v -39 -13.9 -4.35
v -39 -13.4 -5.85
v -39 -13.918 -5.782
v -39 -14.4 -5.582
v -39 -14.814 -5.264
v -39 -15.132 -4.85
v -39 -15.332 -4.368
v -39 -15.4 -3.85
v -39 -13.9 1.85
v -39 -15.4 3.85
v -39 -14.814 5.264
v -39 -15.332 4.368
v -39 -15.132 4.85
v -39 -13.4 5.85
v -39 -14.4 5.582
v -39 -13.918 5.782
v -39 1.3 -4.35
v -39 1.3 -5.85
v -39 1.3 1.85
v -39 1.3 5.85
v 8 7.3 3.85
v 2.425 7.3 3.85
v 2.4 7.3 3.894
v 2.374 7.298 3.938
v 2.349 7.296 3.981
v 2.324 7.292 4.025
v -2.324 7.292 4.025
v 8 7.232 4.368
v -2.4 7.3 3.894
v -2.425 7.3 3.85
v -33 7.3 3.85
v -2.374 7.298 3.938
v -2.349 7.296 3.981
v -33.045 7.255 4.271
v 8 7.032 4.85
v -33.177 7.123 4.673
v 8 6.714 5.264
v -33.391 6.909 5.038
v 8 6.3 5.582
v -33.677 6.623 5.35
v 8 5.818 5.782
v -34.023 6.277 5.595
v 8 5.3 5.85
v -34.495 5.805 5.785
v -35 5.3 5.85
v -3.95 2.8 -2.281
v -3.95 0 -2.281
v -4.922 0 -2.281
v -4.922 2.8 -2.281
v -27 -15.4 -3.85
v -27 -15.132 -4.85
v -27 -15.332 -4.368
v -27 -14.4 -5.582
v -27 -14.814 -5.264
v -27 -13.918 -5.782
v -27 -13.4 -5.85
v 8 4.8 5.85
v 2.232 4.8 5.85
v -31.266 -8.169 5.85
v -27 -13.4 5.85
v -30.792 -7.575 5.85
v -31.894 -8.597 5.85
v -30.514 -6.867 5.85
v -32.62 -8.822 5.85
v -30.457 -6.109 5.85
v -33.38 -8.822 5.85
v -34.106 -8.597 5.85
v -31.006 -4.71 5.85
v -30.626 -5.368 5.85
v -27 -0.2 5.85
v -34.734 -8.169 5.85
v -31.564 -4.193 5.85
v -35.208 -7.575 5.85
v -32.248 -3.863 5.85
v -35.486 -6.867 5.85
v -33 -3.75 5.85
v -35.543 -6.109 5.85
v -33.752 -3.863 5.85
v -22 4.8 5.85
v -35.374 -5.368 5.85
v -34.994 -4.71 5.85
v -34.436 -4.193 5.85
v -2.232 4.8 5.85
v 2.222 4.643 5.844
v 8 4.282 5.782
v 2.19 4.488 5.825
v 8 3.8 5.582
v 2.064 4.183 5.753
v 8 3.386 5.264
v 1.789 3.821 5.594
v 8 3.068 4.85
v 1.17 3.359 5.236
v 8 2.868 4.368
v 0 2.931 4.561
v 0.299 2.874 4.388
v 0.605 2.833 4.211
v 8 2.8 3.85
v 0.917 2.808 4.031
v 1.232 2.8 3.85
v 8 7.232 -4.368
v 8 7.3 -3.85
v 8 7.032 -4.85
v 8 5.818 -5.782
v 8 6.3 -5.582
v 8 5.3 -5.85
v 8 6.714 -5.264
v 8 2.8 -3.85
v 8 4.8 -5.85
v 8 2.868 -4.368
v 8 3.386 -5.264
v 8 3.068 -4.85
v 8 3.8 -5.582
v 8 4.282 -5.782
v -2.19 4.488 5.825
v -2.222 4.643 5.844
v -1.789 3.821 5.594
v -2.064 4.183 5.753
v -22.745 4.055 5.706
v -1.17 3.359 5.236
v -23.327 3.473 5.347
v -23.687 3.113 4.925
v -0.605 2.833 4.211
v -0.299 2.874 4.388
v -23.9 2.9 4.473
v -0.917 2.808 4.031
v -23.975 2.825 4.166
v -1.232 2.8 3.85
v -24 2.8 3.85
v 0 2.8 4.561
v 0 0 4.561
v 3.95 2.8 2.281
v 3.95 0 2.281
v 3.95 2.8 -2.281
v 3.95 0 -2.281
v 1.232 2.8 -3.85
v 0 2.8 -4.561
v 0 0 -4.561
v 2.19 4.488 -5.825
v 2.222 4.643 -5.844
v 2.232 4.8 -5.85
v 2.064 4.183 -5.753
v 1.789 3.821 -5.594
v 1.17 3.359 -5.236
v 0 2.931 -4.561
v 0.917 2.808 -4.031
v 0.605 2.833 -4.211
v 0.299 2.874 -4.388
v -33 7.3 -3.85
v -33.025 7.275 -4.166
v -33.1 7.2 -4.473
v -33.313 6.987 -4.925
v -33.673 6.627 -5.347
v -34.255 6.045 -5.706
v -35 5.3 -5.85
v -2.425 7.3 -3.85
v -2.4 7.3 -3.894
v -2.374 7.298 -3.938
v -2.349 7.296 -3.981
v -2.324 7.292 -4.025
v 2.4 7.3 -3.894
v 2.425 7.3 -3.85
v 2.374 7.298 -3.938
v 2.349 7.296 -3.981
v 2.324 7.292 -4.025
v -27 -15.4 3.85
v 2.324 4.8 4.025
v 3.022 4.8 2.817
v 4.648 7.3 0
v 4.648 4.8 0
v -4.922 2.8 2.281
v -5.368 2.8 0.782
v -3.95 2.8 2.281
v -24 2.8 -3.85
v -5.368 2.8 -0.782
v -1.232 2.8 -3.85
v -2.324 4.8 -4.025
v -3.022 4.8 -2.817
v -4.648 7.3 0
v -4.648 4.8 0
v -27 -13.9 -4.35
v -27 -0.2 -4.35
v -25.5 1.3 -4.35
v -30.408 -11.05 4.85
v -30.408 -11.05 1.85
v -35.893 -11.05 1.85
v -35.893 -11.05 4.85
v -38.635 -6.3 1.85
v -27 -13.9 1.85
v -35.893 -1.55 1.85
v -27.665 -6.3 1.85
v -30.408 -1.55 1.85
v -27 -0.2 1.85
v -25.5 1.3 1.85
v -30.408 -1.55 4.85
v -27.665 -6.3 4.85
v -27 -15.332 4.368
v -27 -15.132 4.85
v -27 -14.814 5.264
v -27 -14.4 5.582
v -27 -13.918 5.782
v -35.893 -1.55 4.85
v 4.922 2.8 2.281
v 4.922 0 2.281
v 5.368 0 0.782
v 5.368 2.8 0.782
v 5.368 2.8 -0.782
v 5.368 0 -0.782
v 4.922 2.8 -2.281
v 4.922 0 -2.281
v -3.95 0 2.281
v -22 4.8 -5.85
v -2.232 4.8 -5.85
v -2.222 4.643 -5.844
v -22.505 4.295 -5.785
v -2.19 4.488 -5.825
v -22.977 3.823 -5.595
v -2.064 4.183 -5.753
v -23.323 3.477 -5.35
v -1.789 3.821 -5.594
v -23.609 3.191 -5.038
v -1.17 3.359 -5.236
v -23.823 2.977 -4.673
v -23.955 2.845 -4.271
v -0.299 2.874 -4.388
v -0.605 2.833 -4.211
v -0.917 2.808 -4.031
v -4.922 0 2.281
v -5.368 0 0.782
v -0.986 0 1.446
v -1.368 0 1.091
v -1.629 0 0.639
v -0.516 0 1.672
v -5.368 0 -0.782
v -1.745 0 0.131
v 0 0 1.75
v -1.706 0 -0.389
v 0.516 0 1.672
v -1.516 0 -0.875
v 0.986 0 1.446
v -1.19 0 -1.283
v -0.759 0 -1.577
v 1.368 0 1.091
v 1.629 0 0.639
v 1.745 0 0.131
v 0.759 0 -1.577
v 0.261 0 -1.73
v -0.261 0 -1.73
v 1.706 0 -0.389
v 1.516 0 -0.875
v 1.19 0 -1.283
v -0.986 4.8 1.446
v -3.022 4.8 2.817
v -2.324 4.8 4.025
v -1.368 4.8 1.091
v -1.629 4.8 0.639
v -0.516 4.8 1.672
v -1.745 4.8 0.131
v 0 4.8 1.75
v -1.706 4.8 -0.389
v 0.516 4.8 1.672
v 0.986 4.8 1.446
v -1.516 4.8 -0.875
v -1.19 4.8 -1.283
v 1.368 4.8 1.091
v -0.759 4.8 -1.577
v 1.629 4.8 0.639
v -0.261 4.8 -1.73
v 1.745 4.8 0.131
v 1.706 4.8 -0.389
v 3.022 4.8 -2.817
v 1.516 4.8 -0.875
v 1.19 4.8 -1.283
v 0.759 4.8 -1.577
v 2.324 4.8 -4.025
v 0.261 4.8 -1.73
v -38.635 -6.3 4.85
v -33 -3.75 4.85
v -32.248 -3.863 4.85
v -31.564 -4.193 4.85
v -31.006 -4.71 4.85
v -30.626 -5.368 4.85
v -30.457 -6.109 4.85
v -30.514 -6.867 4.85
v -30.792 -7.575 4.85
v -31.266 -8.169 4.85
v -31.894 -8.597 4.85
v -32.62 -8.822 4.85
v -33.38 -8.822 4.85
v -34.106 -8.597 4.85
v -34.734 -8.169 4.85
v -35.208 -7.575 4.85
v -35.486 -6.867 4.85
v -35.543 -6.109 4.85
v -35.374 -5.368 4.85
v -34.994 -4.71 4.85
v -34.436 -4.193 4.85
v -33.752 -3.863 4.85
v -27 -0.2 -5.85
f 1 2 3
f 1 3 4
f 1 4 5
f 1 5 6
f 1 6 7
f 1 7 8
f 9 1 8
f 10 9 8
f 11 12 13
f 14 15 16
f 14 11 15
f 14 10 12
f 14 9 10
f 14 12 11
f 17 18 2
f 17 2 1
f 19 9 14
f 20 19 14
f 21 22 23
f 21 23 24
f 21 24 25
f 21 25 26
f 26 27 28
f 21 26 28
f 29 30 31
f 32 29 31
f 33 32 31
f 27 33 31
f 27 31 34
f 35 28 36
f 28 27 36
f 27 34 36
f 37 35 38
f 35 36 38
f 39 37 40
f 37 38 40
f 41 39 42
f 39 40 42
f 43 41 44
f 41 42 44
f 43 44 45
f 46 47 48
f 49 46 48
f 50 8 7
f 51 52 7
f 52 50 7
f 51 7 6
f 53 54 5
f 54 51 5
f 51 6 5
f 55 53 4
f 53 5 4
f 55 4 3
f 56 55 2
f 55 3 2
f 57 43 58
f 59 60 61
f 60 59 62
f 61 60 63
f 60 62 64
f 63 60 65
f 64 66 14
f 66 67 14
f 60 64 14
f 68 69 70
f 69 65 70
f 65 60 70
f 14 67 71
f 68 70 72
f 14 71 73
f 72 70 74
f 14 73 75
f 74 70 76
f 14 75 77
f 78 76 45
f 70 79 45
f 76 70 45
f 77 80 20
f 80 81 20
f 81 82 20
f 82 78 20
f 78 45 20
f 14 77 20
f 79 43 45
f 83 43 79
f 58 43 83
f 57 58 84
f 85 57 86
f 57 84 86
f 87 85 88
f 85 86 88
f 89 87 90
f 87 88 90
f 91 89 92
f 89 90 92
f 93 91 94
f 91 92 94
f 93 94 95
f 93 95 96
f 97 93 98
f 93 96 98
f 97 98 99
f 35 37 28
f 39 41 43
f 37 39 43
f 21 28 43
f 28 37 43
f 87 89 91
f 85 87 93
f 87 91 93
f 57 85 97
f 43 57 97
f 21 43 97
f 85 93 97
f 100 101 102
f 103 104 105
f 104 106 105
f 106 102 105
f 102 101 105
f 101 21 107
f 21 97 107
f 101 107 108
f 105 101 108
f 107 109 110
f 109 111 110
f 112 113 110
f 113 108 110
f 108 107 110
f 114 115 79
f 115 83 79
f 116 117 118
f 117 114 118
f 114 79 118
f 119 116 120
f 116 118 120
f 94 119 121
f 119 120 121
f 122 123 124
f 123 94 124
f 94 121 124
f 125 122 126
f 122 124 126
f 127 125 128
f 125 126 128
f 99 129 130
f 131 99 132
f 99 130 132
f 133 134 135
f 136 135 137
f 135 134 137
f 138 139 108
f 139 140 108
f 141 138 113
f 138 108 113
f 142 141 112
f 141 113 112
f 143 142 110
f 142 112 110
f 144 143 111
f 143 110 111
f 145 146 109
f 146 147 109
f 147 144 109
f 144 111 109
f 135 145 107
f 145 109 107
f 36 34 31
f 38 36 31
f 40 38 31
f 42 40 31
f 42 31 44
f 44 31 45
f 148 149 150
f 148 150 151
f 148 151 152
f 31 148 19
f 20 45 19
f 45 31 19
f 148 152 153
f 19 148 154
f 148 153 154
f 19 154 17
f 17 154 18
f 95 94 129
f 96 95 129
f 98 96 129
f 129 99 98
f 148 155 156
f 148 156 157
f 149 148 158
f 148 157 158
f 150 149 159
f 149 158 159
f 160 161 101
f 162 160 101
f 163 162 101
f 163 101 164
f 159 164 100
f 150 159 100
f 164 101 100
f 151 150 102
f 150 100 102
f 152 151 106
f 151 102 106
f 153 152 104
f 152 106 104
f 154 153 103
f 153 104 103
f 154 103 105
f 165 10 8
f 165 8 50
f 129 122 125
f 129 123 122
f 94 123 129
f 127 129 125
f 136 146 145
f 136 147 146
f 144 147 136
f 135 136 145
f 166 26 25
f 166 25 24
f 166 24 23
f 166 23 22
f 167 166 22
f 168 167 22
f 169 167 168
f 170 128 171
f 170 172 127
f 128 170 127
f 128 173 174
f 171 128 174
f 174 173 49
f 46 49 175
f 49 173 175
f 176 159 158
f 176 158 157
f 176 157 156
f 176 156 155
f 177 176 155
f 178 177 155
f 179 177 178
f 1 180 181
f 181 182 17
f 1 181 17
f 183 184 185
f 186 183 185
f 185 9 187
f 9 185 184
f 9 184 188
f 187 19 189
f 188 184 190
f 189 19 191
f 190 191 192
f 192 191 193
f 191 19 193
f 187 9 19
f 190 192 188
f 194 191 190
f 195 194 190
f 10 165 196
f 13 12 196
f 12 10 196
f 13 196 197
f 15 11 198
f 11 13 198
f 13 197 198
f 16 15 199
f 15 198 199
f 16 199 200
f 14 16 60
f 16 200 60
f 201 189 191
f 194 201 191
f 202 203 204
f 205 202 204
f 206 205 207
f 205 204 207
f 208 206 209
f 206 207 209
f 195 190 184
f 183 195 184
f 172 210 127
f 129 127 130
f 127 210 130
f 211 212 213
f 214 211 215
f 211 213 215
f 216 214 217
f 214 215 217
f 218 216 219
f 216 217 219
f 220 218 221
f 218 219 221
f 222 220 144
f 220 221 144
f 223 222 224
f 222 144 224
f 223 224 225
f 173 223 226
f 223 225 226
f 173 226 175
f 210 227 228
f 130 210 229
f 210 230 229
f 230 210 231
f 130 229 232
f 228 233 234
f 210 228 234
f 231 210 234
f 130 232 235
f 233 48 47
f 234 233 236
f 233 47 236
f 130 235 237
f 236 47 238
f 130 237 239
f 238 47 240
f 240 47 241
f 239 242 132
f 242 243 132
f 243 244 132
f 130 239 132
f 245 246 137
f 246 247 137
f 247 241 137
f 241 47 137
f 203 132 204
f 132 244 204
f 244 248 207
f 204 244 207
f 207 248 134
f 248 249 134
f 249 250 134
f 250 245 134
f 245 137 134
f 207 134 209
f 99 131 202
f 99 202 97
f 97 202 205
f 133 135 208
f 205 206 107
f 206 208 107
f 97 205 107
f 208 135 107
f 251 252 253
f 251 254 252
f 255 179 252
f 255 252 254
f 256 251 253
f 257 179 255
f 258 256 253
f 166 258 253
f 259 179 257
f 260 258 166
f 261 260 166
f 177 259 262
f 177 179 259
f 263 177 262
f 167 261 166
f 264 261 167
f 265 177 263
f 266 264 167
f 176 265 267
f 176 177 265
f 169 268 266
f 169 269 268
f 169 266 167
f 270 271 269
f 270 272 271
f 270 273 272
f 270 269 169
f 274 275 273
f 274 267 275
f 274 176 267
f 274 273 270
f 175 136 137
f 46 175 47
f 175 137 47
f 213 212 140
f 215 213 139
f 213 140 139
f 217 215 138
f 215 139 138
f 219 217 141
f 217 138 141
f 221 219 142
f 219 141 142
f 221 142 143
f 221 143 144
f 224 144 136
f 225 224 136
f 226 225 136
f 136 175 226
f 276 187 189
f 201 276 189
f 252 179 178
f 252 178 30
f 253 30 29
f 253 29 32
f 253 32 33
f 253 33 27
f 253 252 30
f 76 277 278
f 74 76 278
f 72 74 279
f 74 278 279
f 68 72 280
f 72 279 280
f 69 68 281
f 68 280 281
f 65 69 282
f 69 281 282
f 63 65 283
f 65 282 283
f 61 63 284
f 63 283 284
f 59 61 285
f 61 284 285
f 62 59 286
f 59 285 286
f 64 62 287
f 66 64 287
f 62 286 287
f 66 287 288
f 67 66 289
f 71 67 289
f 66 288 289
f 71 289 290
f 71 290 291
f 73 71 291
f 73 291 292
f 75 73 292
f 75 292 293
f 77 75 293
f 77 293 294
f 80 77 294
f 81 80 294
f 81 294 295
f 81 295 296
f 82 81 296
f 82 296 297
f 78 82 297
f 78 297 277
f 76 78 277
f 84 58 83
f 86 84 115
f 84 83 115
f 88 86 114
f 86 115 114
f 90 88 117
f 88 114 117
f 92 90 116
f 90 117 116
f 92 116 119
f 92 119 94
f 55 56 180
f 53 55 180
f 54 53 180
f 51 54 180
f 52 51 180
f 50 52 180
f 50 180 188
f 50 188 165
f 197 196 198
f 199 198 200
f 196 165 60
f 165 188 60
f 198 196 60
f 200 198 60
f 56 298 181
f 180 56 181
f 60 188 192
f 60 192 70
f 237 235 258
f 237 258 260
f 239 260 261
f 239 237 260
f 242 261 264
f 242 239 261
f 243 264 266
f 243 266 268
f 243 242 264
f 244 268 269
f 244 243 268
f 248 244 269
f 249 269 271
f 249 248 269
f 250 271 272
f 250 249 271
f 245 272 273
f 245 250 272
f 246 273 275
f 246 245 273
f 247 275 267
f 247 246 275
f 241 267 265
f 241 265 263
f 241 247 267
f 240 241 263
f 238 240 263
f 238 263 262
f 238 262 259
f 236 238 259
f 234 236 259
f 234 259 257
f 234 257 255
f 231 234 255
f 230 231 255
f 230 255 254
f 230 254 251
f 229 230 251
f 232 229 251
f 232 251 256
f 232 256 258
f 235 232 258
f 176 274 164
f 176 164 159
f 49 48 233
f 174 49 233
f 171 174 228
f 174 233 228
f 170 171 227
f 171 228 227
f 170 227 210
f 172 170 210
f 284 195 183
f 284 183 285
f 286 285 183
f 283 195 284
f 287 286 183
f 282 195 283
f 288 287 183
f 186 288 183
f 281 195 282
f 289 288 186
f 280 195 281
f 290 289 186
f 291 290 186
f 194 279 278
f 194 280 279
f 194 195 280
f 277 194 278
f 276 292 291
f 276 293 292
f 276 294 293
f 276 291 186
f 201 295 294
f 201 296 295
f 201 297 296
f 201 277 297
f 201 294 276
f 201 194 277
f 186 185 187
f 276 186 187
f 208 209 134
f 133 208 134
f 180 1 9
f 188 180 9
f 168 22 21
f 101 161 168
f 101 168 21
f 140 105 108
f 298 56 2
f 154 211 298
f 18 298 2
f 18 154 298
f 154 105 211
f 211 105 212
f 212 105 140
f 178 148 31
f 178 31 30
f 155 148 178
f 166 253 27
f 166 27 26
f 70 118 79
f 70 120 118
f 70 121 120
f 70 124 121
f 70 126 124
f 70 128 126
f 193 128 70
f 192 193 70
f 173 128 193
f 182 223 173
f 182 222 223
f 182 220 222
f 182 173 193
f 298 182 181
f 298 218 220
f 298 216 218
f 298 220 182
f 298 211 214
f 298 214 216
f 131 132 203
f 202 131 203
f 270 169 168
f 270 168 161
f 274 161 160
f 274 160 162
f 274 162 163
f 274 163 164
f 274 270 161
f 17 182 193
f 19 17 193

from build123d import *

# Parameters (mm, degrees)
SKETCH1_R           = 1.75
BOSS_EXTRUDE1_DEPTH = 2.8
SKETCH2_W           = 47
SKETCH2_H           = 11.7
BOSS_EXTRUDE2_DEPTH = 4.5
SKETCH2_4_R         = 1.75
BOSS_EXTRUDE3_DEPTH = 2
SKETCH3_W           = 12
SKETCH3_H           = 11.7
BOSS_EXTRUDE4_DEPTH = 18.2
SKETCH4_W           = 6.2
SKETCH4_H           = 15.2
CUT_EXTRUDE2_DEPTH  = 17.2
SKETCH5_R           = 2.55
CUT_EXTRUDE4_DEPTH  = 3
SKETCH5_2_R         = 2.55
CUT_EXTRUDE5_DEPTH  = 43.631561079
FILLET1_R           = 2
CHAMFER1_SIZE       = 3
FILLET2_R           = 2
CHAMFER2_SIZE       = 6


with BuildPart() as part:
    # Sketch1 → Boss-Extrude1 (new body)
    with BuildSketch(Plane(origin=(0, 0, 0), x_dir=(1, 0, 0), z_dir=(0, 1, 0))):
        with BuildLine():
            Line((-3.95, 2.280533563), (-4.922376628, 2.280533563))
            ThreePointArc((-4.922376628, 2.280533563), (-5.425, 0), (-4.922376628, -2.280533563))
            Line((-4.922376628, -2.280533563), (-3.95, -2.280533563))
            Line((-3.95, -2.280533563), (0, -4.561067127))
            Line((0, -4.561067127), (3.95, -2.280533563))
            Line((3.95, -2.280533563), (4.922376628, -2.280533563))
            ThreePointArc((4.922376628, -2.280533563), (5.425, 0), (4.922376628, 2.280533563))
            Line((4.922376628, 2.280533563), (3.95, 2.280533563))
            Line((3.95, 2.280533563), (0, 4.561067127))
            Line((0, 4.561067127), (-3.95, 2.280533563))
        make_face()
        with Locations(Location((0, 0, 0), (0, 0, 270))):
            Circle(SKETCH1_R, mode=Mode.SUBTRACT)
    extrude(amount=BOSS_EXTRUDE1_DEPTH)

    # Sketch2 → Boss-Extrude2 (add)
    with BuildSketch(Plane(origin=(0, 2.8, 0), x_dir=(1, 0, 0), z_dir=(0, 1, 0))):
        with Locations((-15.5, 0)):
            Rectangle(SKETCH2_W, SKETCH2_H)
        Polygon((4.647669667, 0), (2.323834833, 4.025), (-2.323834833, 4.025), (-4.647669667, 0), (-2.323834833, -4.025), (2.323834833, -4.025), align=None, mode=Mode.SUBTRACT)
    extrude(amount=BOSS_EXTRUDE2_DEPTH)

    # Sketch2<4> → Boss-Extrude3 (add)
    # profile 1 of 5: a face of its own
    with BuildSketch(Plane(origin=(0, 2.8, 0), x_dir=(1, 0, 0), z_dir=(0, 1, 0))):
        Polygon((0.9284955, 4.025), (3.0215045, 2.81660069), (2.323834833, 4.025), align=None)
    # profile 2 of 5: a face of its own
    with BuildSketch(Plane(origin=(0, 2.8, 0), x_dir=(1, 0, 0), z_dir=(0, 1, 0))):
        Polygon((3.0215045, -2.81660069), (4.647669667, 0), (3.0215045, 2.81660069), (0.9284955, 4.025), (-0.9284955, 4.025), (-3.0215045, 2.81660069), (-4.647669667, 0), (-3.0215045, -2.81660069), (-0.9284955, -4.025), (0.9284955, -4.025), align=None)
        with Locations(Location((0, 0, 0), (0, 0, 270))):
            Circle(SKETCH2_4_R, mode=Mode.SUBTRACT)
    # profile 3 of 5: a face of its own
    with BuildSketch(Plane(origin=(0, 2.8, 0), x_dir=(1, 0, 0), z_dir=(0, 1, 0))):
        Polygon((2.323834833, -4.025), (3.0215045, -2.81660069), (0.9284955, -4.025), align=None)
    # profile 4 of 5: a face of its own
    with BuildSketch(Plane(origin=(0, 2.8, 0), x_dir=(1, 0, 0), z_dir=(0, 1, 0))):
        Polygon((-2.323834833, -4.025), (-0.9284955, -4.025), (-3.0215045, -2.81660069), align=None)
    # profile 5 of 5: a face of its own
    with BuildSketch(Plane(origin=(0, 2.8, 0), x_dir=(1, 0, 0), z_dir=(0, 1, 0))):
        Polygon((-3.0215045, 2.81660069), (-0.9284955, 4.025), (-2.323834833, 4.025), align=None)
    extrude(amount=BOSS_EXTRUDE3_DEPTH)

    # Sketch3 → Boss-Extrude4 (add)
    with BuildSketch(Plane.XZ.offset(-2.8)):
        with Locations((-33, 0)):
            Rectangle(SKETCH3_W, SKETCH3_H)
    extrude(amount=BOSS_EXTRUDE4_DEPTH)

    # Sketch4 → Cut-Extrude2 (cut)
    with BuildSketch(Plane.ZY.offset(39)):
        with Locations((-1.25, -6.3)):
            Rectangle(SKETCH4_W, SKETCH4_H)
    extrude(amount=-CUT_EXTRUDE2_DEPTH, mode=Mode.SUBTRACT)

    # Sketch5 → Cut-Extrude4 (cut)
    with BuildSketch(Plane(origin=(0, 0, 1.85), x_dir=(-1, 0, 0), z_dir=(0, 0, -1))):
        Polygon((38.634973236, -6.3), (35.892559458, -1.55), (30.4077319, -1.55), (27.665318122, -6.3), (30.4077319, -11.05), (35.892559458, -11.05), align=None)
        with Locations(Location((33, -6.3, 0), (0, 0, 90))):
            Circle(SKETCH5_R, mode=Mode.SUBTRACT)
    extrude(amount=-CUT_EXTRUDE4_DEPTH, mode=Mode.SUBTRACT)

    # Sketch5<2> → Cut-Extrude5 (cut, through all)
    with BuildSketch(Plane(origin=(0, 0, 1.85), x_dir=(-1, 0, 0), z_dir=(0, 0, -1))):
        with Locations(Location((33, -6.3, 0), (0, 0, 90))):
            Circle(SKETCH5_2_R)
    extrude(amount=-CUT_EXTRUDE5_DEPTH, mode=Mode.SUBTRACT)

    # Fillet1
    # the kernel refuses this fillet: 2 mm, written as the material it takes off along each edge
    with BuildSketch(Plane(origin=(-22, -15.4, 5.85), x_dir=(0, 1, 0), z_dir=(-1, 0, 0)), Plane(origin=(-44, -15.4, -5.85), x_dir=(0, 1, 0), z_dir=(1, 0, 0))) as fillet1_piece_1:
        with BuildLine():
            CenterArc((FILLET1_R, FILLET1_R), FILLET1_R, 180, 90)
            Line((0, FILLET1_R), (0, 0))
            Line((0, 0), (FILLET1_R, 0))
        make_face()
    extrude(amount=22, mode=Mode.SUBTRACT)
    with BuildSketch(Plane(origin=(-44, 7.3, 5.85), x_dir=(0, -1, 0), z_dir=(1, 0, 0)), Plane(origin=(13, 7.3, -5.85), x_dir=(0, -1, 0), z_dir=(-1, 0, 0))) as fillet1_piece_2:
        with BuildLine():
            CenterArc((FILLET1_R, FILLET1_R), FILLET1_R, 180, 90)
            Line((0, FILLET1_R), (0, 0))
            Line((0, 0), (FILLET1_R, 0))
        make_face()
    extrude(amount=57, mode=Mode.SUBTRACT)

    # Chamfer1
    # the kernel refuses this chamfer: 3 mm, written as the material it adds along each edge
    with BuildSketch(Plane(origin=(-27, 2.8, -5.85), x_dir=(0.9996219169112968, 0.027495876610586334, 0), z_dir=(0, 0, 1))) as chamfer1_piece_1_section:
        Polygon((CHAMFER1_SIZE * 0.999621916911, -CHAMFER1_SIZE * 0.0274958766106), (-CHAMFER1_SIZE * 0.0274958766106, -CHAMFER1_SIZE * 0.999621916911), (0, 0), align=None)
    chamfer1_piece_1 = extrude(amount=11.7, mode=Mode.PRIVATE)
    chamfer1_piece_1 = split(chamfer1_piece_1, bisect_by=Plane(origin=(-25.819796748, 1.3, -5.1), z_dir=(0, 1, 0)), keep=Keep.TOP, mode=Mode.PRIVATE)
    chamfer1_piece_1 = split(chamfer1_piece_1, bisect_by=Plane(origin=(-25.819796748, 2.175297131, -4.35), z_dir=(0, 0, -1)), keep=Keep.TOP, mode=Mode.PRIVATE)
    add(chamfer1_piece_1)
    with BuildSketch(Plane(origin=(-27, 2.8, -5.85), x_dir=(0.9996219169112968, 0.027495876610586334, 0), z_dir=(0, 0, 1))) as chamfer1_piece_2_section:
        Polygon((CHAMFER1_SIZE * 0.999621916911, -CHAMFER1_SIZE * 0.0274958766106), (-CHAMFER1_SIZE * 0.0274958766106, -CHAMFER1_SIZE * 0.999621916911), (0, 0), align=None)
    chamfer1_piece_2 = extrude(amount=11.7, mode=Mode.PRIVATE)
    chamfer1_piece_2 = split(chamfer1_piece_2, bisect_by=Plane(origin=(-26.56328803, 1.3, -5.1), z_dir=(0, -1, 0)), keep=Keep.TOP, mode=Mode.PRIVATE)
    chamfer1_piece_2 = split(chamfer1_piece_2, bisect_by=Plane(origin=(-26.56328803, 0.754421165, -4.35), z_dir=(0, 0, -1)), keep=Keep.TOP, mode=Mode.PRIVATE)
    add(chamfer1_piece_2)
    with BuildSketch(Plane(origin=(-27, 2.8, -5.85), x_dir=(0.9996219169112968, 0.027495876610586334, 0), z_dir=(0, 0, 1))) as chamfer1_piece_3_section:
        Polygon((CHAMFER1_SIZE * 0.999621916911, -CHAMFER1_SIZE * 0.0274958766106), (-CHAMFER1_SIZE * 0.0274958766106, -CHAMFER1_SIZE * 0.999621916911), (0, 0), align=None)
    chamfer1_piece_3 = extrude(amount=11.7, mode=Mode.PRIVATE)
    chamfer1_piece_3 = split(chamfer1_piece_3, bisect_by=Plane(origin=(-25.819796748, 1.3, -1.25), z_dir=(0, 1, 0)), keep=Keep.TOP, mode=Mode.PRIVATE)
    chamfer1_piece_3 = split(chamfer1_piece_3, bisect_by=Plane(origin=(-25.819796748, 2.175297131, 1.85), z_dir=(0, 0, -1)), keep=Keep.TOP, mode=Mode.PRIVATE)
    chamfer1_piece_3 = split(chamfer1_piece_3, bisect_by=Plane(origin=(-25.819796748, 2.175297131, -4.35), z_dir=(0, 0, 1)), keep=Keep.TOP, mode=Mode.PRIVATE)
    add(chamfer1_piece_3)
    with BuildSketch(Plane(origin=(-27, 2.8, -5.85), x_dir=(0.9996219169112968, 0.027495876610586334, 0), z_dir=(0, 0, 1))) as chamfer1_piece_4_section:
        Polygon((CHAMFER1_SIZE * 0.999621916911, -CHAMFER1_SIZE * 0.0274958766106), (-CHAMFER1_SIZE * 0.0274958766106, -CHAMFER1_SIZE * 0.999621916911), (0, 0), align=None)
    chamfer1_piece_4 = extrude(amount=11.7, mode=Mode.PRIVATE)
    chamfer1_piece_4 = split(chamfer1_piece_4, bisect_by=Plane(origin=(-25.819796748, 1.3, 3.85), z_dir=(0, 1, 0)), keep=Keep.TOP, mode=Mode.PRIVATE)
    chamfer1_piece_4 = split(chamfer1_piece_4, bisect_by=Plane(origin=(-25.819796748, 2.175297131, 1.85), z_dir=(0, 0, 1)), keep=Keep.TOP, mode=Mode.PRIVATE)
    add(chamfer1_piece_4)
    with BuildSketch(Plane(origin=(-27, 2.8, -5.85), x_dir=(0.9996219169112968, 0.027495876610586334, 0), z_dir=(0, 0, 1))) as chamfer1_piece_5_section:
        Polygon((CHAMFER1_SIZE * 0.999621916911, -CHAMFER1_SIZE * 0.0274958766106), (-CHAMFER1_SIZE * 0.0274958766106, -CHAMFER1_SIZE * 0.999621916911), (0, 0), align=None)
    chamfer1_piece_5 = extrude(amount=11.7, mode=Mode.PRIVATE)
    chamfer1_piece_5 = split(chamfer1_piece_5, bisect_by=Plane(origin=(-26.56328803, 1.3, 3.85), z_dir=(0, -1, 0)), keep=Keep.TOP, mode=Mode.PRIVATE)
    chamfer1_piece_5 = split(chamfer1_piece_5, bisect_by=Plane(origin=(-26.56328803, 0.754421165, 1.85), z_dir=(0, 0, 1)), keep=Keep.TOP, mode=Mode.PRIVATE)
    add(chamfer1_piece_5)

    # Fillet2
    # the kernel refuses this fillet: 2 mm, written as the material it takes off along each edge
    with BuildSketch(Plane(origin=(-29, 2.8, 5.85), x_dir=(0, 1, 0), z_dir=(1, 0, 0))) as fillet2_piece_1_section:
        with BuildLine():
            CenterArc((FILLET2_R, -FILLET2_R), FILLET2_R, 90, 90)
            Line((0, -FILLET2_R), (0, 0))
            Line((0, 0), (FILLET2_R, 0))
        make_face()
    fillet2_piece_1 = extrude(amount=42, mode=Mode.PRIVATE)
    fillet2_piece_1 = split(fillet2_piece_1, bisect_by=Plane(origin=(-18.041164539, 8.758835461, 5.380594006), z_dir=(0.7071067811868302, -0.7071067811862648, 0)), keep=Keep.TOP, mode=Mode.PRIVATE)
    fillet2_piece_1 = split(fillet2_piece_1, bisect_by=Plane(origin=(-9.744227799, 3.236820588, 10.186899669), z_dir=(-0.5, 0, -0.8660254037844387)), keep=Keep.TOP, mode=Mode.PRIVATE)
    fillet2_piece_1 = split(fillet2_piece_1, bisect_by=Plane(origin=(-9.034496702, 3.236820588, -0.655001976), z_dir=(-0.4999999999999998, 0, 0.8660254037844388)), keep=Keep.TOP, mode=Mode.PRIVATE)
    add(fillet2_piece_1, mode=Mode.SUBTRACT)
    with BuildSketch(Plane(origin=(-29, 2.8, 5.85), x_dir=(0, 1, 0), z_dir=(1, 0, 0))) as fillet2_piece_2_section:
        with BuildLine():
            CenterArc((FILLET2_R, -FILLET2_R), FILLET2_R, 90, 90)
            Line((0, -FILLET2_R), (0, 0))
            Line((0, 0), (FILLET2_R, 0))
        make_face()
    fillet2_piece_2 = extrude(amount=42, mode=Mode.PRIVATE)
    fillet2_piece_2 = split(fillet2_piece_2, bisect_by=Plane(origin=(-0.44699773, 3.373635394, 4.819141386), z_dir=(0.5, 0, 0.8660254037844387)), keep=Keep.TOP, mode=Mode.PRIVATE)
    fillet2_piece_2 = split(fillet2_piece_2, bisect_by=Plane(origin=(0.44699773, 3.373635394, 4.819141386), z_dir=(-0.4999999999999998, 0, 0.8660254037844388)), keep=Keep.TOP, mode=Mode.PRIVATE)
    add(fillet2_piece_2, mode=Mode.SUBTRACT)
    with BuildSketch(Plane(origin=(-29, 2.8, 5.85), x_dir=(0, 1, 0), z_dir=(1, 0, 0))) as fillet2_piece_3_section:
        with BuildLine():
            CenterArc((FILLET2_R, -FILLET2_R), FILLET2_R, 90, 90)
            Line((0, -FILLET2_R), (0, 0))
            Line((0, 0), (FILLET2_R, 0))
        make_face()
    fillet2_piece_3 = extrude(amount=42, mode=Mode.PRIVATE)
    fillet2_piece_3 = split(fillet2_piece_3, bisect_by=Plane(origin=(5.072316414, 3.23833996, 1.632563879), z_dir=(0.5, 0, 0.8660254037844387)), keep=Keep.TOP, mode=Mode.PRIVATE)
    fillet2_piece_3 = split(fillet2_piece_3, bisect_by=Plane(origin=(5.777120332, 3.23833996, 7.896489105), z_dir=(0.4999999999999998, 0, -0.8660254037844388)), keep=Keep.TOP, mode=Mode.PRIVATE)
    add(fillet2_piece_3, mode=Mode.SUBTRACT)
    with BuildSketch(Plane(origin=(13, 2.8, -5.85), x_dir=(0, 0, 1), z_dir=(-1, 0, 0))) as fillet2_piece_4_section:
        with BuildLine():
            CenterArc((FILLET2_R, FILLET2_R), FILLET2_R, 180, 90)
            Line((0, FILLET2_R), (0, 0))
            Line((0, 0), (FILLET2_R, 0))
        make_face()
    fillet2_piece_4 = extrude(amount=42, mode=Mode.PRIVATE)
    fillet2_piece_4 = split(fillet2_piece_4, bisect_by=Plane(origin=(5.777120334, 3.23833996, -7.896489107), z_dir=(0.49999999999999983, 0, 0.8660254037844388)), keep=Keep.TOP, mode=Mode.PRIVATE)
    fillet2_piece_4 = split(fillet2_piece_4, bisect_by=Plane(origin=(5.072316416, 3.23833996, -1.632563878), z_dir=(0.4999999999999997, 0, -0.866025403784439)), keep=Keep.TOP, mode=Mode.PRIVATE)
    add(fillet2_piece_4, mode=Mode.SUBTRACT)
    with BuildSketch(Plane(origin=(13, 2.8, -5.85), x_dir=(0, 0, 1), z_dir=(-1, 0, 0))) as fillet2_piece_5_section:
        with BuildLine():
            CenterArc((FILLET2_R, FILLET2_R), FILLET2_R, 180, 90)
            Line((0, FILLET2_R), (0, 0))
            Line((0, 0), (FILLET2_R, 0))
        make_face()
    fillet2_piece_5 = extrude(amount=42, mode=Mode.PRIVATE)
    fillet2_piece_5 = split(fillet2_piece_5, bisect_by=Plane(origin=(0.44699773, 3.373635394, -4.819141386), z_dir=(-0.49999999999999983, 0, -0.8660254037844388)), keep=Keep.TOP, mode=Mode.PRIVATE)
    fillet2_piece_5 = split(fillet2_piece_5, bisect_by=Plane(origin=(-0.44699773, 3.373635394, -4.819141386), z_dir=(0.4999999999999997, 0, -0.866025403784439)), keep=Keep.TOP, mode=Mode.PRIVATE)
    add(fillet2_piece_5, mode=Mode.SUBTRACT)
    with BuildSketch(Plane(origin=(13, 2.8, -5.85), x_dir=(0, 0, 1), z_dir=(-1, 0, 0))) as fillet2_piece_6_section:
        with BuildLine():
            CenterArc((FILLET2_R, FILLET2_R), FILLET2_R, 180, 90)
            Line((0, FILLET2_R), (0, 0))
            Line((0, 0), (FILLET2_R, 0))
        make_face()
    fillet2_piece_6 = extrude(amount=42, mode=Mode.PRIVATE)
    fillet2_piece_6 = split(fillet2_piece_6, bisect_by=Plane(origin=(-18.041164541, 8.758835459, -5.380594006), z_dir=(0.7071067811868302, -0.7071067811862648, 0)), keep=Keep.TOP, mode=Mode.PRIVATE)
    fillet2_piece_6 = split(fillet2_piece_6, bisect_by=Plane(origin=(-9.034496704, 3.236820588, 0.655001977), z_dir=(-0.49999999999999983, 0, -0.8660254037844388)), keep=Keep.TOP, mode=Mode.PRIVATE)
    fillet2_piece_6 = split(fillet2_piece_6, bisect_by=Plane(origin=(-9.744227801, 3.236820588, -10.18689967), z_dir=(-0.4999999999999997, 0, 0.866025403784439)), keep=Keep.TOP, mode=Mode.PRIVATE)
    add(fillet2_piece_6, mode=Mode.SUBTRACT)

    # Chamfer2
    # the kernel refuses this chamfer: 6 mm, written as the material it takes off along each edge
    with BuildSketch(Plane(origin=(-39, 7.3, -19.280097928), x_dir=(0.9996219169112968, 0.027495876610586334, 0), z_dir=(0, 0, 1))) as chamfer2_piece_1:
        Polygon((CHAMFER2_SIZE * 0.999621916911, -CHAMFER2_SIZE * 0.0274958766106), (-CHAMFER2_SIZE * 0.0274958766106, -CHAMFER2_SIZE * 0.999621916911), (0, 0), align=None)
    extrude(amount=38.560195856, mode=Mode.SUBTRACT)


solid = part.part
